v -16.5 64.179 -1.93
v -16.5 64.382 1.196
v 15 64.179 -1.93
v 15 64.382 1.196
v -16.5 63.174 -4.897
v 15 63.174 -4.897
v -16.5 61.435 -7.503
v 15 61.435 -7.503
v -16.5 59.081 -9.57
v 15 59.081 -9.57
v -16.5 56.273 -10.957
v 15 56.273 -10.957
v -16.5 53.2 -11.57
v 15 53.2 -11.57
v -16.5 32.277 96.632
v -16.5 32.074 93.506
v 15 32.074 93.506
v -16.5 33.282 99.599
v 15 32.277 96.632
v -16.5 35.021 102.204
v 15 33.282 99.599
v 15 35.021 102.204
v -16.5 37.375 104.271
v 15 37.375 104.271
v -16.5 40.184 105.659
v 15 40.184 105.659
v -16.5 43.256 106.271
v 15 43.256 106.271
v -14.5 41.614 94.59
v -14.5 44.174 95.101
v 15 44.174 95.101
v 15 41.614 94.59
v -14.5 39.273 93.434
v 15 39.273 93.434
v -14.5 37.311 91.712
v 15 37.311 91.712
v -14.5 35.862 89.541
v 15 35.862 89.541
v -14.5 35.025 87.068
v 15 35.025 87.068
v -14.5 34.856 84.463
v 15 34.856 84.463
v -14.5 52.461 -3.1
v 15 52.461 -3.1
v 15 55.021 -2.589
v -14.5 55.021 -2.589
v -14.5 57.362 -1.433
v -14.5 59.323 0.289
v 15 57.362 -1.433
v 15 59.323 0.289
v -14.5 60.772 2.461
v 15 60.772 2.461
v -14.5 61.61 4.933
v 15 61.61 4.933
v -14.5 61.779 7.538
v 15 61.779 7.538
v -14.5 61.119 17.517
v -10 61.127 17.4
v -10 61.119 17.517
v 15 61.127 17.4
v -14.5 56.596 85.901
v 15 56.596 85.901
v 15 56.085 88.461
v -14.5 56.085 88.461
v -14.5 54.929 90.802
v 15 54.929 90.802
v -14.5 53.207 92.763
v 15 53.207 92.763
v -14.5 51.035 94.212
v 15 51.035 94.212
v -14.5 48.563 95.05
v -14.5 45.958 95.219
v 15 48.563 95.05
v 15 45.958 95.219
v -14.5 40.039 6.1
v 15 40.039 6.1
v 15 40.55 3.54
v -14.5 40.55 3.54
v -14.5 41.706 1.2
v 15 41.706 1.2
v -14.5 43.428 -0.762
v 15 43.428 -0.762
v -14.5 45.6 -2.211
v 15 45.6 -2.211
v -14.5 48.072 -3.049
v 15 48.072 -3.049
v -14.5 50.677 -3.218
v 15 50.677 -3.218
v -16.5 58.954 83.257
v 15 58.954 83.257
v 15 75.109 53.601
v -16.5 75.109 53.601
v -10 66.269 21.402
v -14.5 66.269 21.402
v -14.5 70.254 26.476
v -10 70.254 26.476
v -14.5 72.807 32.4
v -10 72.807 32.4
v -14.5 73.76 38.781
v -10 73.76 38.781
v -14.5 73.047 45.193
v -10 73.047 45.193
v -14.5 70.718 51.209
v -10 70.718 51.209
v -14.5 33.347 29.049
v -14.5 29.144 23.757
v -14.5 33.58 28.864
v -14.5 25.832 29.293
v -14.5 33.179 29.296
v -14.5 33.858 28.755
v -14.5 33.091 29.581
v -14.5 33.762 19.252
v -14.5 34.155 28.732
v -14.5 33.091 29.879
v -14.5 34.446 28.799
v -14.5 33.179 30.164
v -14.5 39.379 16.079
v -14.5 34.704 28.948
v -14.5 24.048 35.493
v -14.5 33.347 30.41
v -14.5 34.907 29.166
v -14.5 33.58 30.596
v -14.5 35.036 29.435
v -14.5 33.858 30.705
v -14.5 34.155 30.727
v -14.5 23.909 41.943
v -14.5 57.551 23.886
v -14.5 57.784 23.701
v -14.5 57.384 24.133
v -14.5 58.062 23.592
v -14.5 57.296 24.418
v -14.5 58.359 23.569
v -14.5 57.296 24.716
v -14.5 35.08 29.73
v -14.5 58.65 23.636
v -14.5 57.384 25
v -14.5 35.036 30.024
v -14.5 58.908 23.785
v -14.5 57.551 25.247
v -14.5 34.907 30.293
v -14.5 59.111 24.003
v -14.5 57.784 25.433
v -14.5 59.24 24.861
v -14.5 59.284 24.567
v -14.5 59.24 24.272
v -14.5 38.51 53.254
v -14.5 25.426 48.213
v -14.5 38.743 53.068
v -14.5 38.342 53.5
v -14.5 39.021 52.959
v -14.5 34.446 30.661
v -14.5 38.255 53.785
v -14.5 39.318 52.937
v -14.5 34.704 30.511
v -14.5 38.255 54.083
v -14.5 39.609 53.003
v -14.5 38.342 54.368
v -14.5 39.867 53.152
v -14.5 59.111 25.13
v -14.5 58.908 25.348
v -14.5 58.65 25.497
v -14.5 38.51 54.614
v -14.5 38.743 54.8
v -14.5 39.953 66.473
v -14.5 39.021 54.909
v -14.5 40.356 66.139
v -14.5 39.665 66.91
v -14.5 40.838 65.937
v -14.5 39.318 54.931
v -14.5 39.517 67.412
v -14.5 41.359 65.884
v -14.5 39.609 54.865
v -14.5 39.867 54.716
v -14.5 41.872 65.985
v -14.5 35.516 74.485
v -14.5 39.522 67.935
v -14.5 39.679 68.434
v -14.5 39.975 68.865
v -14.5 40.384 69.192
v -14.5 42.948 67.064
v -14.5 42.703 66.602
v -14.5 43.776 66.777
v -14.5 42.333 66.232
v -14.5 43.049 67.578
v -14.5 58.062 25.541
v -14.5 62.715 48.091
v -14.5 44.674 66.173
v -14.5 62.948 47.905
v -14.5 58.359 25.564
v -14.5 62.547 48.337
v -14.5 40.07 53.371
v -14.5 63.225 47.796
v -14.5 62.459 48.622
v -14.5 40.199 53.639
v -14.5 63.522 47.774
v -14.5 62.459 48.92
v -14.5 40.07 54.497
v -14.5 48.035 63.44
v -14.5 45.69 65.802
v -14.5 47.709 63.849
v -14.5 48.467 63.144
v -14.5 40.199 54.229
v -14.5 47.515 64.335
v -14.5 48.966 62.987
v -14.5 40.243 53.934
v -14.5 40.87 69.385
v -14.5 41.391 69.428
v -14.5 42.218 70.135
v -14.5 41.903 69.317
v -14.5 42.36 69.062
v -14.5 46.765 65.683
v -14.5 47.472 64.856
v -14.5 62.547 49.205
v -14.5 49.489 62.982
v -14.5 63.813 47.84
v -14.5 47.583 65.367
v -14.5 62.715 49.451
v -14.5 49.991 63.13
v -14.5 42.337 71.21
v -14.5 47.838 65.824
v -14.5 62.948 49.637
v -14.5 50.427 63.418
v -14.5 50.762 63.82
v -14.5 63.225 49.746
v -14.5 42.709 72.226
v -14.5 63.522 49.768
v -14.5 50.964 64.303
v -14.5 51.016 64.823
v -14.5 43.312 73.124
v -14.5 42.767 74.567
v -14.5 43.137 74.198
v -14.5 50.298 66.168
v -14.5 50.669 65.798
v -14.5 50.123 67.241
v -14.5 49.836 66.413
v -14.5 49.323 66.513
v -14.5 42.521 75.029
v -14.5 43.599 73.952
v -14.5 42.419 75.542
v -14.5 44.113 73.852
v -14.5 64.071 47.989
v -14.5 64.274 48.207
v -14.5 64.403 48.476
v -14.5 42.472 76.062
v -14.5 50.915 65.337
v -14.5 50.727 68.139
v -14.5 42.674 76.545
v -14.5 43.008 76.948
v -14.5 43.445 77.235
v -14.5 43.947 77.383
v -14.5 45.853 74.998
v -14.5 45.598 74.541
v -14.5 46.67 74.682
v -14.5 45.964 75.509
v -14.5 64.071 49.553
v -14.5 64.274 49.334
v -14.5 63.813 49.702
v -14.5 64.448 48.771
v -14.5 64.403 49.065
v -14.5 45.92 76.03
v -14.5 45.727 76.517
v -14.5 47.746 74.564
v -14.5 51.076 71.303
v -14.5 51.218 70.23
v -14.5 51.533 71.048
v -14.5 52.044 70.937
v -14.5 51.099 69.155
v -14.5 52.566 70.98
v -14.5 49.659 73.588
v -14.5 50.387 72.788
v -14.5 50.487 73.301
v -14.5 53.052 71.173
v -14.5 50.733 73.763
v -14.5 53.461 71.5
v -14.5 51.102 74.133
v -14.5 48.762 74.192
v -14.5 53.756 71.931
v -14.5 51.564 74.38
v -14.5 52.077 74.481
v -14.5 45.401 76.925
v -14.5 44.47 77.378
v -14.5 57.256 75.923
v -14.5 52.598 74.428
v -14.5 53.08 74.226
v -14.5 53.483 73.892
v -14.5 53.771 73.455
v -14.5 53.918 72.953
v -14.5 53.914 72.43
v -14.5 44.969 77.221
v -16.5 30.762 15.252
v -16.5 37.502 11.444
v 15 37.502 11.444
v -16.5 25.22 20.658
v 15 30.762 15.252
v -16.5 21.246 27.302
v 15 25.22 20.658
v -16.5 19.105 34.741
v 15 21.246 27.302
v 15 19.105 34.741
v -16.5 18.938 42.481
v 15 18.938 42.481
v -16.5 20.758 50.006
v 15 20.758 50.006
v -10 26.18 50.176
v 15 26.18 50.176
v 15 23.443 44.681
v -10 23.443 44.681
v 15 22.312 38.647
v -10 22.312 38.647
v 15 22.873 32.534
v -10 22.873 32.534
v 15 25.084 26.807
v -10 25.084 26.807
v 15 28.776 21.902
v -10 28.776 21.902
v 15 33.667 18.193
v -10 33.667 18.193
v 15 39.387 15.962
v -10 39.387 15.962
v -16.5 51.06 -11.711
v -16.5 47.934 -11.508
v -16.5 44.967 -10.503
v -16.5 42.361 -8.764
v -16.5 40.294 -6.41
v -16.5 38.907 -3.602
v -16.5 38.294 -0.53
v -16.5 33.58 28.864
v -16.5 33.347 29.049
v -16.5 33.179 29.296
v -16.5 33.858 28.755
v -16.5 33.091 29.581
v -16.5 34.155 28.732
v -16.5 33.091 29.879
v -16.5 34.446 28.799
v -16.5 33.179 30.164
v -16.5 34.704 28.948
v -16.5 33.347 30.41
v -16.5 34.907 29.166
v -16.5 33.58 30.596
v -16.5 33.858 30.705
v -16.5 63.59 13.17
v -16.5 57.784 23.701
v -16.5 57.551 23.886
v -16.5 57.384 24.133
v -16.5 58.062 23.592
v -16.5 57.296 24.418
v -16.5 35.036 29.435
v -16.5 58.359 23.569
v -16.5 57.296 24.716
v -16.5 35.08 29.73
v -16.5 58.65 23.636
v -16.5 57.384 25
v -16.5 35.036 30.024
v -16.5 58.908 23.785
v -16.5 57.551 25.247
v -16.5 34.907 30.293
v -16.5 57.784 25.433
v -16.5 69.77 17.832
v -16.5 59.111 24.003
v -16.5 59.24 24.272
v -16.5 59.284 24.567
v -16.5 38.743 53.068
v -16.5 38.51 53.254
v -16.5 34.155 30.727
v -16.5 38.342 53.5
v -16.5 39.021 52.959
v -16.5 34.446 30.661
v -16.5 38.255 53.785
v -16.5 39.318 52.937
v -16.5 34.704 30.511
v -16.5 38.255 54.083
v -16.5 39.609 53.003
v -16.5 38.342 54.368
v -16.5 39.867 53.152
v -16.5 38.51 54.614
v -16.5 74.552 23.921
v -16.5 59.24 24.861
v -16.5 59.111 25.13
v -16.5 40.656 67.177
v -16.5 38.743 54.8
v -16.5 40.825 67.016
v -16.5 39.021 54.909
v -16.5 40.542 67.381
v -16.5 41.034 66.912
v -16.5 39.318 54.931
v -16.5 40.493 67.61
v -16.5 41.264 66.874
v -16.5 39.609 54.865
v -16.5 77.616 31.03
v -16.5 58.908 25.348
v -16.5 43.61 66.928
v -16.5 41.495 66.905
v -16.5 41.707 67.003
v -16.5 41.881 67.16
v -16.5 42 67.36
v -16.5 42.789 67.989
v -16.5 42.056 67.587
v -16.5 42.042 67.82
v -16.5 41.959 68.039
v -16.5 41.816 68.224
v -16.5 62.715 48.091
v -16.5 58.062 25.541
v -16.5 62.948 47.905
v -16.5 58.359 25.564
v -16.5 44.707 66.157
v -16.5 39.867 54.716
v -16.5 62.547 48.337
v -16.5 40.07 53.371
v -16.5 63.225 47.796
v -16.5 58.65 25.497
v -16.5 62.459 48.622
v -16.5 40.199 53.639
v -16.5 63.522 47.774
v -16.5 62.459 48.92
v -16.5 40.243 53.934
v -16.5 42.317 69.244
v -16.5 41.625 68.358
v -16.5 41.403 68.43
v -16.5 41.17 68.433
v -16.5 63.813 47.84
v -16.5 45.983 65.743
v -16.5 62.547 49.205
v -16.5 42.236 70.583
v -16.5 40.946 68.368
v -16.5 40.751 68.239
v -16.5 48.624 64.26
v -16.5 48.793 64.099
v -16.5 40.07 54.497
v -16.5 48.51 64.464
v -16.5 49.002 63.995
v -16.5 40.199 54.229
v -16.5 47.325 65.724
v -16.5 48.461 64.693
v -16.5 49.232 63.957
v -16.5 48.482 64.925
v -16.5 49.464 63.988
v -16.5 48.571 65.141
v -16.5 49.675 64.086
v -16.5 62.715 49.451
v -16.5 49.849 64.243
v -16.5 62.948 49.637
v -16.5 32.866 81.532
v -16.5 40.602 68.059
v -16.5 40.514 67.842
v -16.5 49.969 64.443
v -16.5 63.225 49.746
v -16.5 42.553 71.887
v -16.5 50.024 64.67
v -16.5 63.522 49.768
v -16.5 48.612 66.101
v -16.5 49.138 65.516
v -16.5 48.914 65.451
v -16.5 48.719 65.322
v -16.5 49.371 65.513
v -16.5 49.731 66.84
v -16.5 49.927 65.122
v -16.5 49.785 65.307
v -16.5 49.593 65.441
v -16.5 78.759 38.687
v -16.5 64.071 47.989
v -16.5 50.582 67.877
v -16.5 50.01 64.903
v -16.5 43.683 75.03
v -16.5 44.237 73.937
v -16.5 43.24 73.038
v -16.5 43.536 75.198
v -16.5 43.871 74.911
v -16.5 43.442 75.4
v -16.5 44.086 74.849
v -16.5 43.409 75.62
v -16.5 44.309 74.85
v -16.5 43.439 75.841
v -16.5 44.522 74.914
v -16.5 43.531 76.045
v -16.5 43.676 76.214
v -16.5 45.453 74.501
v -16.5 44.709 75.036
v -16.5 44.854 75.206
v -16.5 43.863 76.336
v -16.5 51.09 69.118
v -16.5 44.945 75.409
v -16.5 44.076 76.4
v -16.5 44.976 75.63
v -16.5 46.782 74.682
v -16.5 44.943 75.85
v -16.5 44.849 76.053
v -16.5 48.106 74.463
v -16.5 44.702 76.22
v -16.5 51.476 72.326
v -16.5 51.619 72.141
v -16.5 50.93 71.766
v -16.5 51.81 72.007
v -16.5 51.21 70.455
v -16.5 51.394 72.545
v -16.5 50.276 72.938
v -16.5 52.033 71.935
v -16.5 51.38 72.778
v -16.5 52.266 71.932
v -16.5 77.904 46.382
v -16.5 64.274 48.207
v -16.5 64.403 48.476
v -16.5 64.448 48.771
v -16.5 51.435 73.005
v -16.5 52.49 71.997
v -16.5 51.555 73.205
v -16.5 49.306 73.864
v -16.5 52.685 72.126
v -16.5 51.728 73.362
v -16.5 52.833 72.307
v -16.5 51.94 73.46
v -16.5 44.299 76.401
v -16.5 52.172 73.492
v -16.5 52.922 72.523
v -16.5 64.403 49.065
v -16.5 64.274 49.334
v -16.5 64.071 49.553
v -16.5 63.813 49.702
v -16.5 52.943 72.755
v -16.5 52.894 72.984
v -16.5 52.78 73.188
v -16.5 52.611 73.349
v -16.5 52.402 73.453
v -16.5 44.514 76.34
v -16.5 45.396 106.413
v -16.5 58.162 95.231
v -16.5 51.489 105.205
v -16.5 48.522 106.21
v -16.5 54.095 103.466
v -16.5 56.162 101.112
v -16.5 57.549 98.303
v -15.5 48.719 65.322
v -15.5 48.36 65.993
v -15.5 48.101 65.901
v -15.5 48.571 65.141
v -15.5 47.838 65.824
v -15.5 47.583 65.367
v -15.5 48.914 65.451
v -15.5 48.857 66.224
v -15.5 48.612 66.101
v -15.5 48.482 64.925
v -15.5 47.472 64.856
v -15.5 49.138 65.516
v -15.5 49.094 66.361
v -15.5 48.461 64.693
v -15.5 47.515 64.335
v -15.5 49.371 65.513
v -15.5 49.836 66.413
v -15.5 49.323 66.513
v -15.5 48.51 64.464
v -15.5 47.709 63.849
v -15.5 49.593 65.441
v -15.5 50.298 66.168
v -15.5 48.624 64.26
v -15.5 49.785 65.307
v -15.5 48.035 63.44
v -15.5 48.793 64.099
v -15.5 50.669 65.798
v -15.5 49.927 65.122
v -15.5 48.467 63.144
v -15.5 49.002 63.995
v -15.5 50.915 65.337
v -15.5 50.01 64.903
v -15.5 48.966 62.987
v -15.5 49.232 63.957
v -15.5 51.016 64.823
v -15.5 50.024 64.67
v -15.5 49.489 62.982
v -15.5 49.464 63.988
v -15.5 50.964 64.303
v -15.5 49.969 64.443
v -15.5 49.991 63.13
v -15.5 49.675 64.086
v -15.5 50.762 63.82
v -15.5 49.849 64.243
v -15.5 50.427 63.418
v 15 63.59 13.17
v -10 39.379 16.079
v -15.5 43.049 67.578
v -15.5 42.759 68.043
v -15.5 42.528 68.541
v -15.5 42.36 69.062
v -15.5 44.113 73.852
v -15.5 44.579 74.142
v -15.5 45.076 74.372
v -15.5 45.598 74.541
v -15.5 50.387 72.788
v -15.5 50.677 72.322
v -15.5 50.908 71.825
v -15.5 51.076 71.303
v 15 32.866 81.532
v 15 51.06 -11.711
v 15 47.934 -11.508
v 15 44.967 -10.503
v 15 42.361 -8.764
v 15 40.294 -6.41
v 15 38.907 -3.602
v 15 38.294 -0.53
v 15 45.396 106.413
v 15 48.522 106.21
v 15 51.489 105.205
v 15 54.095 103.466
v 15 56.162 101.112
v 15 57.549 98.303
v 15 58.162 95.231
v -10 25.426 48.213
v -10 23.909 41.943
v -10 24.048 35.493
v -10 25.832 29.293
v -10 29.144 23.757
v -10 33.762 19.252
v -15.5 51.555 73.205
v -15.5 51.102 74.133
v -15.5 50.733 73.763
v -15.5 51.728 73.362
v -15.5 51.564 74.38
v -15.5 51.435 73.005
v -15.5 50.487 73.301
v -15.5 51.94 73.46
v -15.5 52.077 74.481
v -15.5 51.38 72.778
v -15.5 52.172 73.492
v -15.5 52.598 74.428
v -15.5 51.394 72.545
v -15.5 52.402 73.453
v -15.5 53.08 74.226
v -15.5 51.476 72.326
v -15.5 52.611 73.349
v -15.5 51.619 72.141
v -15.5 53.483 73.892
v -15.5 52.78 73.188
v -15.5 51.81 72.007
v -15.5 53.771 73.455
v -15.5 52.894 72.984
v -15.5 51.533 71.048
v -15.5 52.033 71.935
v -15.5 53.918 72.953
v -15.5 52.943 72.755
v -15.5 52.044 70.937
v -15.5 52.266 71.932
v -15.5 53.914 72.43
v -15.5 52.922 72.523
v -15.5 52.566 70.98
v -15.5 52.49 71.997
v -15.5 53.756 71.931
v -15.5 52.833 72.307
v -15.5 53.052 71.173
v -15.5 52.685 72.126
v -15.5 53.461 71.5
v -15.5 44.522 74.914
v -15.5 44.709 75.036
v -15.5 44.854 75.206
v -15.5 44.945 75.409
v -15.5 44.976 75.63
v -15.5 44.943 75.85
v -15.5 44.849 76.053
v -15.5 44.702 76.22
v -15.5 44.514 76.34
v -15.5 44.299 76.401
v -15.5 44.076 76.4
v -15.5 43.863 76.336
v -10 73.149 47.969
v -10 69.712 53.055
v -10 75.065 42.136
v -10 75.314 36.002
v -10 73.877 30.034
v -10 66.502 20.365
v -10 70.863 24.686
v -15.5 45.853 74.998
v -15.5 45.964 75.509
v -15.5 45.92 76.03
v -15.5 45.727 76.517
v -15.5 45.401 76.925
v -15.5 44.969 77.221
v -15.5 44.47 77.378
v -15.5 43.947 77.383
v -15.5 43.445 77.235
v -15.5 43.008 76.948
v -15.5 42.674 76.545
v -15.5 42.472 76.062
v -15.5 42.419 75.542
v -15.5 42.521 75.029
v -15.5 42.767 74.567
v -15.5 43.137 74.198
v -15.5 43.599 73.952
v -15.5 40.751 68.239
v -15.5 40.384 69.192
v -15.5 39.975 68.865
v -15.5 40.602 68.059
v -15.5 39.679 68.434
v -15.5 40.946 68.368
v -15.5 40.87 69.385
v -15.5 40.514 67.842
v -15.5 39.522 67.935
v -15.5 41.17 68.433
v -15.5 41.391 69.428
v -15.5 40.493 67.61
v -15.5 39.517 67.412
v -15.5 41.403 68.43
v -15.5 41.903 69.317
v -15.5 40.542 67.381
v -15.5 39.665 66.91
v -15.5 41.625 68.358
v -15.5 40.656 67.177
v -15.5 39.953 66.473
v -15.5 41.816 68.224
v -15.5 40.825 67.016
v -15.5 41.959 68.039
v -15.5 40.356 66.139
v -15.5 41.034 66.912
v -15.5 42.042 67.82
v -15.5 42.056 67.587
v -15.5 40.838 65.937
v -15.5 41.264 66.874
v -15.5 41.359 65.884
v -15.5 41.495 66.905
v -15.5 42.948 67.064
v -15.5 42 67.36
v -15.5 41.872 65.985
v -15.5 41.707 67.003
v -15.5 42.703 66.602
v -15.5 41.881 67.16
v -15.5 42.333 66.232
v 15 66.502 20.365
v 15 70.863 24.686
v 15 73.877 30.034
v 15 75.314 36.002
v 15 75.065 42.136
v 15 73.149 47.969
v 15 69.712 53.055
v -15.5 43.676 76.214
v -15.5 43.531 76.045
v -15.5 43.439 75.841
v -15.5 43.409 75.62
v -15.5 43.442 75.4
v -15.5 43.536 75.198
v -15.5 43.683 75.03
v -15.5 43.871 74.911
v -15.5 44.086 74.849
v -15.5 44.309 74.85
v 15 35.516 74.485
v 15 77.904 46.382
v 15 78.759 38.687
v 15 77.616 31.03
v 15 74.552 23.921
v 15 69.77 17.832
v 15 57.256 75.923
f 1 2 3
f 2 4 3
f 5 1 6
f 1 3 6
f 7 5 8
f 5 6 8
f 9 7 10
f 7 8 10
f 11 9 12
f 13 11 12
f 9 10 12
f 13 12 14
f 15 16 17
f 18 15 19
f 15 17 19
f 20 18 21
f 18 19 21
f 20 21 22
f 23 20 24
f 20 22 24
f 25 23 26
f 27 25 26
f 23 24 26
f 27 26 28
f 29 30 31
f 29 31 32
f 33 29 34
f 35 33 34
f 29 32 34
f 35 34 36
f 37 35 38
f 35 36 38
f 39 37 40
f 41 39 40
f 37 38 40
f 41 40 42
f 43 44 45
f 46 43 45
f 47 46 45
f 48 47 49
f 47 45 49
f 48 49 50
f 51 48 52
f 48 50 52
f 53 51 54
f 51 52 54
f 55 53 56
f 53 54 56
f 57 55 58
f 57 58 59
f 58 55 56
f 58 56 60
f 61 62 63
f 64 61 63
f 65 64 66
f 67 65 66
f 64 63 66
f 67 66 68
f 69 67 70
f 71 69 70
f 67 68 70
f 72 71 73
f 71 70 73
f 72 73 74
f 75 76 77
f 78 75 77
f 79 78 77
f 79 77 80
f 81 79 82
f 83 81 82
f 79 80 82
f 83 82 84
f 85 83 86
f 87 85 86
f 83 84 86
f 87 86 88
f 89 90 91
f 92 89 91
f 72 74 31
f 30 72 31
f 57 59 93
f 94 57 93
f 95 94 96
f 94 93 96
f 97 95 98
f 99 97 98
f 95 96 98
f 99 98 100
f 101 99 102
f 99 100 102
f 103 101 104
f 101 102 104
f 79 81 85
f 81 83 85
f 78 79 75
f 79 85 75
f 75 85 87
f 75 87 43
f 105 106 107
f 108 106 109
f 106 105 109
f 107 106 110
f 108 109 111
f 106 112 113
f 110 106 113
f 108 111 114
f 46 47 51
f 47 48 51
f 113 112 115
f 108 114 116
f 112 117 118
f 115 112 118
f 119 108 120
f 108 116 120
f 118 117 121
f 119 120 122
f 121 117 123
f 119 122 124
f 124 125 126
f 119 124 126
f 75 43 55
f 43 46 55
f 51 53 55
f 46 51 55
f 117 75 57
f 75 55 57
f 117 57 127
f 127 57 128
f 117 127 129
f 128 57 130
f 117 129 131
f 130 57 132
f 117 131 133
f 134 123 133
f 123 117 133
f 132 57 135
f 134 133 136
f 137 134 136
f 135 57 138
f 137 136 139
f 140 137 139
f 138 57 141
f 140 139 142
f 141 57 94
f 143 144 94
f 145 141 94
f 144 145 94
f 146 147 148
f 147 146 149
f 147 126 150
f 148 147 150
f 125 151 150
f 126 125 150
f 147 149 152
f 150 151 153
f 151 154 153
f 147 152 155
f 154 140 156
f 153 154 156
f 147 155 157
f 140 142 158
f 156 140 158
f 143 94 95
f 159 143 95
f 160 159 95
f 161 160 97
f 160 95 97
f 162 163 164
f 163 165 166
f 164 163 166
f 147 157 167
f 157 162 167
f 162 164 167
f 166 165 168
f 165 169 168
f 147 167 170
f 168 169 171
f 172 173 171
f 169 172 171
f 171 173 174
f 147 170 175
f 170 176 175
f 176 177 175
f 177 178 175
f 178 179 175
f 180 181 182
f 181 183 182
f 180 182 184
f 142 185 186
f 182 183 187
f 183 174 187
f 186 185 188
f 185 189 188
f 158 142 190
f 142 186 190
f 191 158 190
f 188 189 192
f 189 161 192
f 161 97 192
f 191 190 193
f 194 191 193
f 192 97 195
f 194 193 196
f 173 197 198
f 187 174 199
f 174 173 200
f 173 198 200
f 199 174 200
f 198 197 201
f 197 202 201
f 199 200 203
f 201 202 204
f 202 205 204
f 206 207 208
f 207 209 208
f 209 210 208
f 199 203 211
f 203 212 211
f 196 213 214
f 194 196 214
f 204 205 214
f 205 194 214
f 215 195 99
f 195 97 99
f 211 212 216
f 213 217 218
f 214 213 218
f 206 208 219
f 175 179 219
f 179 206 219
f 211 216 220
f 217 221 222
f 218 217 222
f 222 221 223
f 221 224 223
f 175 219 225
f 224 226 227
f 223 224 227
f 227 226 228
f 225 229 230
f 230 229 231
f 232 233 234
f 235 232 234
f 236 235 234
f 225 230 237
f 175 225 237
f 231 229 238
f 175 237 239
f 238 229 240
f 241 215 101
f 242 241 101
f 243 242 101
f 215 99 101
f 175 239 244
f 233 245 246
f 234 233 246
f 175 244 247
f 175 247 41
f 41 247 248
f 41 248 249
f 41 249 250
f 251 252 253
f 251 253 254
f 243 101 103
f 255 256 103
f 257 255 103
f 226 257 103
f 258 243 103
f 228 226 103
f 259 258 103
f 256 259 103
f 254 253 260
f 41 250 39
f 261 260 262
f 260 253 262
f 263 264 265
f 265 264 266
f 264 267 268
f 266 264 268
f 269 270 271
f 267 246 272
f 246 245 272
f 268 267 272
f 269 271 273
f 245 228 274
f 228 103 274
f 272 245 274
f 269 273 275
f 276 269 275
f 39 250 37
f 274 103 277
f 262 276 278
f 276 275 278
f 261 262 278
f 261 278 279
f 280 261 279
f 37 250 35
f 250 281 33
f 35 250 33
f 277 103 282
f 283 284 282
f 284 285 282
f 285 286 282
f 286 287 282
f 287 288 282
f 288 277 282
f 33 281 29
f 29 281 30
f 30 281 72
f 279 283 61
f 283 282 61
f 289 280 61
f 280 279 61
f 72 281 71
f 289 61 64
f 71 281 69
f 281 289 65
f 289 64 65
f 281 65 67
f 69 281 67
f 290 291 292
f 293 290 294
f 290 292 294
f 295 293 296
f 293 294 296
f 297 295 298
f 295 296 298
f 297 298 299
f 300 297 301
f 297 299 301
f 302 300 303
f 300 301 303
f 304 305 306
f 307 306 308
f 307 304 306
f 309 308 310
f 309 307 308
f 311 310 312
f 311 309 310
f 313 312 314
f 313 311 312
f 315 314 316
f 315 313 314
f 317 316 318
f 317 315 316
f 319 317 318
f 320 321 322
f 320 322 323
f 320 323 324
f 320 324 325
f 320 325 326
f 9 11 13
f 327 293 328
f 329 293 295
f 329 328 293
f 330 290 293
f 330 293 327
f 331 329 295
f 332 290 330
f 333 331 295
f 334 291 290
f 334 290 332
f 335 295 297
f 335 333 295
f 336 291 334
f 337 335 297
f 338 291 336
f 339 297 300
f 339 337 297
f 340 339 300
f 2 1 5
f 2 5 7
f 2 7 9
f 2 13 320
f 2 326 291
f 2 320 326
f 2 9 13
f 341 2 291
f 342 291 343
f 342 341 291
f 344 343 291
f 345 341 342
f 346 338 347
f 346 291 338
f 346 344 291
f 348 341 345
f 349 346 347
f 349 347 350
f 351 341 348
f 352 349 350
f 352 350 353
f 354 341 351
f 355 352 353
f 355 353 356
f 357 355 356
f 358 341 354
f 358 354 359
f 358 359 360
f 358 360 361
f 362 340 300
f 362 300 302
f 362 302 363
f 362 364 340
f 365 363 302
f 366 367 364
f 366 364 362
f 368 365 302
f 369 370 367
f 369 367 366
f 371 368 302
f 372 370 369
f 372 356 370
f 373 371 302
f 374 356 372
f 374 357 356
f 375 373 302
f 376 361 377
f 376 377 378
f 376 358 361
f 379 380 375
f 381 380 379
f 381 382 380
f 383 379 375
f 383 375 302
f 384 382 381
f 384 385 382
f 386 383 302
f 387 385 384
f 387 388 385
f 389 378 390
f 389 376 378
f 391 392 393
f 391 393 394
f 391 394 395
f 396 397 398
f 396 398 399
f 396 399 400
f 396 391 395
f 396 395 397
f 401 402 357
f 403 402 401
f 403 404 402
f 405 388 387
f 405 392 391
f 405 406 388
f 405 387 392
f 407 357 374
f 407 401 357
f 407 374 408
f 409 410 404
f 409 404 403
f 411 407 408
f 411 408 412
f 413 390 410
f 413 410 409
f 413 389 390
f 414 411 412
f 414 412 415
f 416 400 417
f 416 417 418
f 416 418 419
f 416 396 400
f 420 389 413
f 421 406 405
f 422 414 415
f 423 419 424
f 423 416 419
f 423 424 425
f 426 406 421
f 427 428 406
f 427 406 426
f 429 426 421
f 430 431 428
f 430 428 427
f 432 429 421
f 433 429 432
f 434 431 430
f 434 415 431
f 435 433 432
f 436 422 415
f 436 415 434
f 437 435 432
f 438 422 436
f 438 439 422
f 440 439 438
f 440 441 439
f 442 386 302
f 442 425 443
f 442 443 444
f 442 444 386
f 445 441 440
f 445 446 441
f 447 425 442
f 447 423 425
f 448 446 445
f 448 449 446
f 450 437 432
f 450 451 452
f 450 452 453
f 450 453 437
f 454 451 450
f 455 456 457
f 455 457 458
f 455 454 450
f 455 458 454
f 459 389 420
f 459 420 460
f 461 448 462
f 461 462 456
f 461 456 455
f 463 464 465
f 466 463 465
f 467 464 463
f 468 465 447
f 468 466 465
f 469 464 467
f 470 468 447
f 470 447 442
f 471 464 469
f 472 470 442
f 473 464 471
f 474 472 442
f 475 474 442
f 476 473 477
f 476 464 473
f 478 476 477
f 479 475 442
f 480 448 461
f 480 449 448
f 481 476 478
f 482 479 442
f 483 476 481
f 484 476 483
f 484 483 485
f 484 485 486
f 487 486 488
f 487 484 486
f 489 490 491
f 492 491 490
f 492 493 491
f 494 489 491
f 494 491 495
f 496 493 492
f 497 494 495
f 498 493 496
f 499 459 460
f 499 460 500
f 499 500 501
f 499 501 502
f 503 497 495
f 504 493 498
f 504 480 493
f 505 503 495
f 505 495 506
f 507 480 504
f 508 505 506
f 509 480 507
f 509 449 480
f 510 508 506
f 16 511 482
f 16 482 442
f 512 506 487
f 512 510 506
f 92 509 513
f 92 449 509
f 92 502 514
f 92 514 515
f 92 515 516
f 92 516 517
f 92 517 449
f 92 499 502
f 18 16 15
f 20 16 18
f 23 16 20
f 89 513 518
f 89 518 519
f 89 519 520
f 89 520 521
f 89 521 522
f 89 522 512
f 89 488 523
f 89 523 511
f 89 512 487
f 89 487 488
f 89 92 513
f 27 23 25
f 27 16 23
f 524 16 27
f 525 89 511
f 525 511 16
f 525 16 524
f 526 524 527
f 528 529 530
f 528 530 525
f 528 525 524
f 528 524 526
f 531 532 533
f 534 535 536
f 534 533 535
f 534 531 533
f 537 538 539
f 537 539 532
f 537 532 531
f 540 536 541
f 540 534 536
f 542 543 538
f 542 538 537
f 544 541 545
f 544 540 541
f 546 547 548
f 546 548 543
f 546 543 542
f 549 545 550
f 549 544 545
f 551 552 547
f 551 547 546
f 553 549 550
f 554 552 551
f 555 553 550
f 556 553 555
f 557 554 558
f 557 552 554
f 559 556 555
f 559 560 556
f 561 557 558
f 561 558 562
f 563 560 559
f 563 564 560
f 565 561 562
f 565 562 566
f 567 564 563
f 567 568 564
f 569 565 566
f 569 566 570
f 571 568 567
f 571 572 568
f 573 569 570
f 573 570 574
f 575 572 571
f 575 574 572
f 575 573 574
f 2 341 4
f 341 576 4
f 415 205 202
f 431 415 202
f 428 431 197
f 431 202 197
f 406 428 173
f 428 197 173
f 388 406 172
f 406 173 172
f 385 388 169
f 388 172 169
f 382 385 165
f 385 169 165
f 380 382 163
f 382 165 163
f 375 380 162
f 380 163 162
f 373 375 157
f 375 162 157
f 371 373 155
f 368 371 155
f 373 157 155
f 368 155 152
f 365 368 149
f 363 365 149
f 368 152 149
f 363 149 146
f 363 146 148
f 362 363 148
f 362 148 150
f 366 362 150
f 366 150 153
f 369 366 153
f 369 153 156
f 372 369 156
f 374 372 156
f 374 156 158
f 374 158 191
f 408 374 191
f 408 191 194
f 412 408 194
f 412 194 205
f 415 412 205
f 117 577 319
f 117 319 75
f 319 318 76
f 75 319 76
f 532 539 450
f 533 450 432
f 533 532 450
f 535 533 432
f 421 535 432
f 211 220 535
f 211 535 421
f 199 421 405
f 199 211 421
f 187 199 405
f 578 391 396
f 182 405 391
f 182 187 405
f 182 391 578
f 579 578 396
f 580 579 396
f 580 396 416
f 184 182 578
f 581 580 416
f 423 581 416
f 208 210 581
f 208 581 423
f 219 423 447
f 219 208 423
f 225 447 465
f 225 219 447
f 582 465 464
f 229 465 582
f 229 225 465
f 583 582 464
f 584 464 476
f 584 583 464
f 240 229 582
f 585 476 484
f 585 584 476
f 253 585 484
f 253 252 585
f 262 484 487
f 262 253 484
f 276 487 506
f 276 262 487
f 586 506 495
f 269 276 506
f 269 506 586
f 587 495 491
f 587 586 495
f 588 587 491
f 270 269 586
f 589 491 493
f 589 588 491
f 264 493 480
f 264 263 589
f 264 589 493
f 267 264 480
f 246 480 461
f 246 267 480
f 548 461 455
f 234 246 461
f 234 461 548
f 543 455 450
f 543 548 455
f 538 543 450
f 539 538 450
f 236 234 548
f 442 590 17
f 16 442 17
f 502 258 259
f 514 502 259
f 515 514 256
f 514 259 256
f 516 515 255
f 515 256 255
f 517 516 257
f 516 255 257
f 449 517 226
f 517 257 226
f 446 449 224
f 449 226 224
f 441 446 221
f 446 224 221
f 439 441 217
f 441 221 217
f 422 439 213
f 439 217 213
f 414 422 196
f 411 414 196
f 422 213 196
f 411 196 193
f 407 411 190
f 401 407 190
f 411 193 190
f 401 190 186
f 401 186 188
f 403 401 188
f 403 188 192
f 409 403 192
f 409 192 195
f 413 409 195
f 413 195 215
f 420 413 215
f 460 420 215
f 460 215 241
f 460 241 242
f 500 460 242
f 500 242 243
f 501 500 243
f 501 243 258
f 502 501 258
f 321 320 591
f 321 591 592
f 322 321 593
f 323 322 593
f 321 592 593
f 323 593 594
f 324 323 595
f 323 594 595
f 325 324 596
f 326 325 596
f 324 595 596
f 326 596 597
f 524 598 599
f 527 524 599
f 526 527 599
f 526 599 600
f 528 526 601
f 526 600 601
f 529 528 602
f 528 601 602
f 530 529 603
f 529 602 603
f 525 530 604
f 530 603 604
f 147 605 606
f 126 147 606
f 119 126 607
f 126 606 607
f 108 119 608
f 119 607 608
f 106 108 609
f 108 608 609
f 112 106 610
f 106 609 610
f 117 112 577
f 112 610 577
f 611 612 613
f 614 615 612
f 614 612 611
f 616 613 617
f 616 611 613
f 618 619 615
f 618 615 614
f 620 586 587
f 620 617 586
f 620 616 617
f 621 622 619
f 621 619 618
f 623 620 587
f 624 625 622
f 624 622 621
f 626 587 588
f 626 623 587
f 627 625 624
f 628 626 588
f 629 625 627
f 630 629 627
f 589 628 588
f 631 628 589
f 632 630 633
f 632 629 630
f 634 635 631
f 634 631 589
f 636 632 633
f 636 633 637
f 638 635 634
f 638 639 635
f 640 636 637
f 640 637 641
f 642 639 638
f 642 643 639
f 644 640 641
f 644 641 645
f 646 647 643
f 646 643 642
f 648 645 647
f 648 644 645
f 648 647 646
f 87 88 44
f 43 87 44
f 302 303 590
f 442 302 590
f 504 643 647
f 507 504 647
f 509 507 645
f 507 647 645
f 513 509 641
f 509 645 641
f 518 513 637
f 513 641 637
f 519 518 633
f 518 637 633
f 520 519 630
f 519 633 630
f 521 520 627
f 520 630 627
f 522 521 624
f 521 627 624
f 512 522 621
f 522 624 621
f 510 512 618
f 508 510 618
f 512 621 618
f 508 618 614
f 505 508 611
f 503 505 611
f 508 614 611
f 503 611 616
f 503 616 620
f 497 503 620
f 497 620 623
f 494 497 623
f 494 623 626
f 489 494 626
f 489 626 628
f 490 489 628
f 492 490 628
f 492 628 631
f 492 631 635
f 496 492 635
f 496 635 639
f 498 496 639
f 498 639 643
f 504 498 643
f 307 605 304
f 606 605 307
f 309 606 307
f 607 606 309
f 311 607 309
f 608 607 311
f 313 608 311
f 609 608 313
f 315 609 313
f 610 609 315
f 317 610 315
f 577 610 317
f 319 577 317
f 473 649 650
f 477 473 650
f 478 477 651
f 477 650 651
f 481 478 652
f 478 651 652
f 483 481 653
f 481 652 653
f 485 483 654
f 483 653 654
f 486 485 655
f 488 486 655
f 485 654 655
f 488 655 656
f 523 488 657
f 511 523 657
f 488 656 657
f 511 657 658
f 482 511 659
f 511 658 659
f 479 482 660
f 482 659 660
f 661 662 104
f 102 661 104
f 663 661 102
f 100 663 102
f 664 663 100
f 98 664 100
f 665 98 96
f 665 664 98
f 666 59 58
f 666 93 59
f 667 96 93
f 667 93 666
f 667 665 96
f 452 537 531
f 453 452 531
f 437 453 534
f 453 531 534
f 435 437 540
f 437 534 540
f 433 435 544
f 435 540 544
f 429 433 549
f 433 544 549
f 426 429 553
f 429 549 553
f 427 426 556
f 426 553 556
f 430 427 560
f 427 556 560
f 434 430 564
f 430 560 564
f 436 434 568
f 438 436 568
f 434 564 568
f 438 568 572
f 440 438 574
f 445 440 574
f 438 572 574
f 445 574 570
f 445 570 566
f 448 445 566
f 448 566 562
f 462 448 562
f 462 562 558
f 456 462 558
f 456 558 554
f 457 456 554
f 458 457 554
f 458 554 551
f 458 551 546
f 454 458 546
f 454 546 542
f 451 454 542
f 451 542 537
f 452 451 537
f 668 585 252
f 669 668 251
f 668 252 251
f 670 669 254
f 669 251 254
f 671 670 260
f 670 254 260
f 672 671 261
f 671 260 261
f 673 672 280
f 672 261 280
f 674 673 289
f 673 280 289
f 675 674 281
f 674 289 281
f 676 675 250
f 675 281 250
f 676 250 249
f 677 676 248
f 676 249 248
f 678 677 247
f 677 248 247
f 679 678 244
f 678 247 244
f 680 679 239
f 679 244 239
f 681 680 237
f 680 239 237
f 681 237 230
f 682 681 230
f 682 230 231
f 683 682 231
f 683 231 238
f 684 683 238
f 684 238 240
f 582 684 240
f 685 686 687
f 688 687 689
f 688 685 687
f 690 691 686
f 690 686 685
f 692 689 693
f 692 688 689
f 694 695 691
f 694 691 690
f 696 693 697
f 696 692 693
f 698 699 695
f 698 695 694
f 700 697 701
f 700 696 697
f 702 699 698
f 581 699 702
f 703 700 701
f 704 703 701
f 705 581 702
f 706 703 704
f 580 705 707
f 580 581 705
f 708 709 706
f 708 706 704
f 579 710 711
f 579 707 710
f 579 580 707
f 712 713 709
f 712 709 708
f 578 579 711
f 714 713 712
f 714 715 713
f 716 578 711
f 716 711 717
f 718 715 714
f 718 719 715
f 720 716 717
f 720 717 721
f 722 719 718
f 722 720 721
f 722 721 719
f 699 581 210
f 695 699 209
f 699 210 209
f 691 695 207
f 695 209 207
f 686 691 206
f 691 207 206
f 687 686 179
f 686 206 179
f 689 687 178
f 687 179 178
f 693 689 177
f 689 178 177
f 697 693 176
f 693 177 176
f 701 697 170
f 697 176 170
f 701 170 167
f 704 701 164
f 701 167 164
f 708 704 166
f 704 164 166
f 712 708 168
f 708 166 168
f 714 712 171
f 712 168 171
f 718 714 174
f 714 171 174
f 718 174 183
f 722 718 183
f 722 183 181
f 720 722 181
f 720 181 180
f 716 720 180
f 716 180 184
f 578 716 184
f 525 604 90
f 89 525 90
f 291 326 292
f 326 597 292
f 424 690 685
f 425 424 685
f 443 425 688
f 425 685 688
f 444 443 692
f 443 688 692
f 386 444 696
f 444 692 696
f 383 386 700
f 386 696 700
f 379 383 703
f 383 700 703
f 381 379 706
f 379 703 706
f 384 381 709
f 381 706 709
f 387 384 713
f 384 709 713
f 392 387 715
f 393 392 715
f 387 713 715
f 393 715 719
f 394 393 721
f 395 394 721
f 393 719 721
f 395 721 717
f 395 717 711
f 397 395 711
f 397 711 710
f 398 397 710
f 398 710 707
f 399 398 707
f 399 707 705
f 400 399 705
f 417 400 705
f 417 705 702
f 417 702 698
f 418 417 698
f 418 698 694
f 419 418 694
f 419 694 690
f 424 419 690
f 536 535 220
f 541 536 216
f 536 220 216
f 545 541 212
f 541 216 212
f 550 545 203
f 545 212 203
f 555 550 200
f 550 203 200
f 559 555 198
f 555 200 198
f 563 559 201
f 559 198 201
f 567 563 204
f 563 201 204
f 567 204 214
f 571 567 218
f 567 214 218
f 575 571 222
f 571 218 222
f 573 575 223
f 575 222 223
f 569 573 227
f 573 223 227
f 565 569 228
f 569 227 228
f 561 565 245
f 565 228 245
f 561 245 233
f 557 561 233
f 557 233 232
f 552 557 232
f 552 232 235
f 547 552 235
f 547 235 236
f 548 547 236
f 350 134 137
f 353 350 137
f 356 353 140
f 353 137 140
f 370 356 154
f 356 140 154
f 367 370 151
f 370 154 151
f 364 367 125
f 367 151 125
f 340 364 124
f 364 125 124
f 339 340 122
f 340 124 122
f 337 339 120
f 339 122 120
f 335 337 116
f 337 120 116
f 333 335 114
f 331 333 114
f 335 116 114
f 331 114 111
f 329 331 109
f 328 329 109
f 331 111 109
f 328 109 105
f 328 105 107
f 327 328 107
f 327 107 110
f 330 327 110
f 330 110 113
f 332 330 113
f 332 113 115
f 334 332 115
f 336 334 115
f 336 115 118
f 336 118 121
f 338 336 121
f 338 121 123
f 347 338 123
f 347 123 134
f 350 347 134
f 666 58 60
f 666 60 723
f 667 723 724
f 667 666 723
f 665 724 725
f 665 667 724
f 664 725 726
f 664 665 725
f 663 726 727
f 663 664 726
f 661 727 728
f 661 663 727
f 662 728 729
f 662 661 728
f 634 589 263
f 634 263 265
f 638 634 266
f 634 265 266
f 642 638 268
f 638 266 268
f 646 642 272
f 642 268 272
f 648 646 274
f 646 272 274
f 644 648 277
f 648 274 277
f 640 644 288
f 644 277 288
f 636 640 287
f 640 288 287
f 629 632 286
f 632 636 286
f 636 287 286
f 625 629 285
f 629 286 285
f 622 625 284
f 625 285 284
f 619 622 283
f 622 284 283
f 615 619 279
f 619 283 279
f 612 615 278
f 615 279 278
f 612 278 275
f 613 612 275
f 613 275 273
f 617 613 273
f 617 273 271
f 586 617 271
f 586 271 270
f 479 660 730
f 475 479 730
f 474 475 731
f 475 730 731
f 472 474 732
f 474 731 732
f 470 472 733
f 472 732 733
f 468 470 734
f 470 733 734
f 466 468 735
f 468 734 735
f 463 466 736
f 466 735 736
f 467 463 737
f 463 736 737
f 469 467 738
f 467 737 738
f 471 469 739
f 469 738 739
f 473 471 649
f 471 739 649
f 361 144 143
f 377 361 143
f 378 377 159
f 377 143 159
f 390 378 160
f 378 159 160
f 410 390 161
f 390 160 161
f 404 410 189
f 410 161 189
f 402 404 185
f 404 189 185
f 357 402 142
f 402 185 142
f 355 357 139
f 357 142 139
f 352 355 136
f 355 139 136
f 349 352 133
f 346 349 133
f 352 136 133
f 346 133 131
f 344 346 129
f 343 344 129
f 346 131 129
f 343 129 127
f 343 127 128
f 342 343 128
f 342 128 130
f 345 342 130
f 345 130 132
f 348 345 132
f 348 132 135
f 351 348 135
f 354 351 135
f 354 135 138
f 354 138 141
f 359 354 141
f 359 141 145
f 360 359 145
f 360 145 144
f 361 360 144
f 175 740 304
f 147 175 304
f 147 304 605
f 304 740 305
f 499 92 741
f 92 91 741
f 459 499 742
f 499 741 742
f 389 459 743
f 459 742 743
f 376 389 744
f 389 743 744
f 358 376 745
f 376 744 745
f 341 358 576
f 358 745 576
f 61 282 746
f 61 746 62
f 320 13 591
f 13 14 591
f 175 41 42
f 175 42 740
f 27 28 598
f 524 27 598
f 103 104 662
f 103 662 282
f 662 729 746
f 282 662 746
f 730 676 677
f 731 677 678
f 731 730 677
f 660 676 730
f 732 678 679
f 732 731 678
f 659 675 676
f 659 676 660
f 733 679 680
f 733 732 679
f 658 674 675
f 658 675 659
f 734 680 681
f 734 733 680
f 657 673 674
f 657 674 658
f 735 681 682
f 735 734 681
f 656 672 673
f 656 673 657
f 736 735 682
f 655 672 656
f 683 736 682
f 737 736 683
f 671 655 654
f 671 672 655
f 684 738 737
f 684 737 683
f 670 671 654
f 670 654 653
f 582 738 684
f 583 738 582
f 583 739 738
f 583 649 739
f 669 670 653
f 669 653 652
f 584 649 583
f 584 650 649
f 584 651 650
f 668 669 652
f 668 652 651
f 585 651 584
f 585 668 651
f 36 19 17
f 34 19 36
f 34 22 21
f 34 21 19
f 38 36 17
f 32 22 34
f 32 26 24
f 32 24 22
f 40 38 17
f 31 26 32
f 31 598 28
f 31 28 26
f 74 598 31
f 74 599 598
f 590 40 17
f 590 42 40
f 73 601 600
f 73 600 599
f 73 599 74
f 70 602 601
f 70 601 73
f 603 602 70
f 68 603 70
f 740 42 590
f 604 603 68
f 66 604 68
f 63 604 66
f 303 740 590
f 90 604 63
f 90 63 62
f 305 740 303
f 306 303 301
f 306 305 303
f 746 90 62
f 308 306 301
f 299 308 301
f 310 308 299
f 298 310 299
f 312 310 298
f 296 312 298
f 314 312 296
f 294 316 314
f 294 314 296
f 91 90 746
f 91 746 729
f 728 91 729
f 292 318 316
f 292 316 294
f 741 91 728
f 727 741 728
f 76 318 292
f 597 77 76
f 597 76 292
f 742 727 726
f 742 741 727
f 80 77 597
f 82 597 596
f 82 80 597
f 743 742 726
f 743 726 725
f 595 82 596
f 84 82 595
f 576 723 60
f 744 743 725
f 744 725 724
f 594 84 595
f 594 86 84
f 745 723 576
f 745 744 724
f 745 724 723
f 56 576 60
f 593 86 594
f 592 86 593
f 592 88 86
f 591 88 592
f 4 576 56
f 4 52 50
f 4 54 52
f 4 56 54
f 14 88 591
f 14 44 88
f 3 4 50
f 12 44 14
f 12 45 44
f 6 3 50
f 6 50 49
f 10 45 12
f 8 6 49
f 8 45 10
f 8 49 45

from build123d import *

# Parameters (mm, degrees)
BOSS_EXTRUDE1_DEPTH = 29.5
CUT_EXTRUDE1_START  = -25
SKETCH2_R           = 22.247000374
CUT_EXTRUDE1_DEPTH  = 25
BOSS_EXTRUDE2_DEPTH = 2
CUT_EXTRUDE2_DEPTH  = 135.751896149
SKETCH5_R           = 1.775
CUT_EXTRUDE4_DEPTH  = 5.5
SKETCH6_R           = 1
CUT_EXTRUDE5_DEPTH  = 136.658849751


with BuildPart() as part:
    # Sketch1 → Boss-Extrude1 (new body)
    with BuildSketch(Plane(origin=(15, 0, 0), x_dir=(0, 0, -1), z_dir=(1, 0, 0))):
        with BuildLine():
            Line((11.711350424, 51.059854885), (11.569757763, 53.200462368))
            ThreePointArc((11.569757763, 53.200462368), (7.502659229, 61.435263917), (-1.19609774, 64.382274981))
            Line((-1.19609774, 64.382274981), (-13.169931797, 63.590253536))
            ThreePointArc((-13.169931797, 63.590253536), (-31.030401227, 77.615886129), (-53.600949688, 75.108879931))
            Line((-53.600949688, 75.108879931), (-83.257445184, 58.954243603))
            Line((-83.257445184, 58.954243603), (-95.231279241, 58.162222158))
            ThreePointArc((-95.231279241, 58.162222158), (-103.466080789, 54.095123625), (-106.413091853, 45.396366656))
            Line((-106.413091853, 45.396366656), (-106.271499192, 43.255759172))
            ThreePointArc((-106.271499192, 43.255759172), (-102.204400659, 35.020957624), (-93.50564369, 32.07394656))
            Line((-93.50564369, 32.07394656), (-81.531809632, 32.865968005))
            Line((-81.531809632, 32.865968005), (-50.005875623, 20.758305769))
            ThreePointArc((-50.005875623, 20.758305769), (-27.30176025, 21.246038307), (-11.444296246, 37.501977938))
            Line((-11.444296246, 37.501977938), (0.529537812, 38.293999383))
            ThreePointArc((0.529537812, 38.293999383), (8.76433936, 42.361097916), (11.711350424, 51.059854885))
        make_face()
        with BuildLine():
            Line((3.217758765, 50.677202056), (3.09976488, 52.461041626))
            ThreePointArc((3.09976488, 52.461041626), (-0.289483897, 59.323376249), (-7.538448038, 61.779218803))
            Line((-7.538448038, 61.779218803), (-17.516643086, 61.119200932))
            ThreePointArc((-17.516643086, 61.119200932), (-32.400367611, 72.807228093), (-51.209157995, 70.718056262))
            Line((-51.209157995, 70.718056262), (-75.922904242, 57.255859321))
            Line((-75.922904242, 57.255859321), (-85.901099289, 56.595841451))
            ThreePointArc((-85.901099289, 56.595841451), (-92.763433913, 53.206592673), (-95.219276466, 45.957628532))
            Line((-95.219276466, 45.957628532), (-95.101282582, 44.173788963))
            ThreePointArc((-95.101282582, 44.173788963), (-91.712033804, 37.311454339), (-84.463069663, 34.855611786))
            Line((-84.463069663, 34.855611786), (-74.484874616, 35.515629656))
            Line((-74.484874616, 35.515629656), (-48.213262941, 25.425911127))
            ThreePointArc((-48.213262941, 25.425911127), (-29.293166796, 25.832354908), (-16.07861346, 39.378971267))
            Line((-16.07861346, 39.378971267), (-6.100418412, 40.038989138))
            ThreePointArc((-6.100418412, 40.038989138), (0.761916211, 43.428237915), (3.217758765, 50.677202056))
        make_face(mode=Mode.SUBTRACT)
    extrude(amount=-BOSS_EXTRUDE1_DEPTH)

    # Sketch2 → Cut-Extrude1 (cut)
    with BuildSketch(Plane(origin=(15, 0, 0), x_dir=(0, 0, -1), z_dir=(1, 0, 0)).offset(CUT_EXTRUDE1_START)):
        with Locations((-38.176329446, 53.173227685)):
            Circle(SKETCH2_R)
        with Locations((-37.60491264, 44.534509548)):
            Circle(SKETCH2_R)
    extrude(amount=CUT_EXTRUDE1_DEPTH, mode=Mode.SUBTRACT)

    # Sketch3 → Boss-Extrude2 (add)
    with BuildSketch(Plane.ZY.offset(14.5)):
        with BuildLine():
            Line((83.257445184, 58.954243603), (53.600949688, 75.108879931))
            ThreePointArc((53.600949688, 75.108879931), (31.030401227, 77.615886129), (13.169931797, 63.590253536))
            Line((13.169931797, 63.590253536), (1.19609774, 64.382274981))
            ThreePointArc((1.19609774, 64.382274981), (-7.502659229, 61.435263917), (-11.569757763, 53.200462368))
            Line((-11.569757763, 53.200462368), (-11.711350424, 51.059854885))
            ThreePointArc((-11.711350424, 51.059854885), (-8.76433936, 42.361097916), (-0.529537812, 38.293999383))
            Line((-0.529537812, 38.293999383), (11.444296246, 37.501977938))
            ThreePointArc((11.444296246, 37.501977938), (27.30176025, 21.246038307), (50.005875623, 20.758305769))
            Line((50.005875623, 20.758305769), (81.531809632, 32.865968005))
            Line((81.531809632, 32.865968005), (93.50564369, 32.07394656))
            ThreePointArc((93.50564369, 32.07394656), (102.204400659, 35.020957624), (106.271499192, 43.255759172))
            Line((106.271499192, 43.255759172), (106.413091853, 45.396366656))
            ThreePointArc((106.413091853, 45.396366656), (103.466080789, 54.095123625), (95.231279241, 58.162222158))
            Line((95.231279241, 58.162222158), (83.257445184, 58.954243603))
        make_face()
        with BuildLine():
            ThreePointArc((74.264539557, 44.823732686), (72.076754007, 50.799817892), (66.100668801, 48.612032342))
            ThreePointArc((66.100668801, 48.612032342), (68.288454351, 42.635947136), (74.264539557, 44.823732686))
        make_face(mode=Mode.SUBTRACT)
    extrude(amount=BOSS_EXTRUDE2_DEPTH)

    # Sketch4 → Cut-Extrude2 (cut, through all)
    with BuildSketch(Plane(origin=(-10, 0, 0), x_dir=(0, 0, -1), z_dir=(1, 0, 0))):
        with BuildLine():
            ThreePointArc((-73.418847587, 51.830670487), (-72.378344752, 51.449752714), (-71.997426979, 52.490255549))
            ThreePointArc((-71.997426979, 52.490255549), (-73.037929814, 52.871173322), (-73.418847587, 51.830670487))
        make_face()
        with BuildLine():
            ThreePointArc((-64.029313371, 49.573208149), (-65.069816206, 49.954125922), (-65.450733979, 48.913623087))
            ThreePointArc((-65.450733979, 48.913623087), (-64.410231144, 48.532705314), (-64.029313371, 49.573208149))
        make_face()
        with BuildLine():
            ThreePointArc((-74.914474378, 44.522141941), (-75.954977214, 44.903059714), (-76.335894987, 43.862556879))
            ThreePointArc((-76.335894987, 43.862556879), (-75.295392151, 43.481639106), (-74.914474378, 44.522141941))
        make_face()
        with BuildLine():
            ThreePointArc((-66.946360771, 41.605094541), (-67.986863606, 41.986012314), (-68.367781379, 40.945509479))
            ThreePointArc((-68.367781379, 40.945509479), (-67.327278544, 40.564591706), (-66.946360771, 41.605094541))
        make_face()
    extrude(amount=-CUT_EXTRUDE2_DEPTH, mode=Mode.SUBTRACT)

    # Sketch5 → Cut-Extrude4 (cut)
    with BuildSketch(Plane(origin=(-10, 0, 0), x_dir=(0, 0, -1), z_dir=(1, 0, 0))):
        with Locations((-72.708137283, 52.160463018)):
            Circle(SKETCH5_R)
        with Locations((-64.740023675, 49.243415618)):
            Circle(SKETCH5_R)
        with Locations((-67.657071075, 41.27530201)):
            Circle(SKETCH5_R)
        with Locations((-75.625184683, 44.19234941)):
            Circle(SKETCH5_R)
    extrude(amount=-CUT_EXTRUDE4_DEPTH, mode=Mode.SUBTRACT)

    # Sketch6 → Cut-Extrude5 (cut, through all)
    with BuildSketch(Plane(origin=(-14.5, 0, 0), x_dir=(0, 0, -1), z_dir=(1, 0, 0))):
        with Locations(Location((-29.729663164, 34.080294384, 0), (0, 0, 90))):
            Circle(SKETCH6_R)
        with Locations(Location((-53.93384306, 39.243401547, 0), (0, 0, 90))):
            Circle(SKETCH6_R)
        with Locations(Location((-24.566556001, 58.28447428, 0), (0, 0, 90))):
            Circle(SKETCH6_R)
        with Locations(Location((-48.770735897, 63.447581443, 0), (0, 0, 90))):
            Circle(SKETCH6_R)
    extrude(amount=-CUT_EXTRUDE5_DEPTH, mode=Mode.SUBTRACT)


solid = part.part
